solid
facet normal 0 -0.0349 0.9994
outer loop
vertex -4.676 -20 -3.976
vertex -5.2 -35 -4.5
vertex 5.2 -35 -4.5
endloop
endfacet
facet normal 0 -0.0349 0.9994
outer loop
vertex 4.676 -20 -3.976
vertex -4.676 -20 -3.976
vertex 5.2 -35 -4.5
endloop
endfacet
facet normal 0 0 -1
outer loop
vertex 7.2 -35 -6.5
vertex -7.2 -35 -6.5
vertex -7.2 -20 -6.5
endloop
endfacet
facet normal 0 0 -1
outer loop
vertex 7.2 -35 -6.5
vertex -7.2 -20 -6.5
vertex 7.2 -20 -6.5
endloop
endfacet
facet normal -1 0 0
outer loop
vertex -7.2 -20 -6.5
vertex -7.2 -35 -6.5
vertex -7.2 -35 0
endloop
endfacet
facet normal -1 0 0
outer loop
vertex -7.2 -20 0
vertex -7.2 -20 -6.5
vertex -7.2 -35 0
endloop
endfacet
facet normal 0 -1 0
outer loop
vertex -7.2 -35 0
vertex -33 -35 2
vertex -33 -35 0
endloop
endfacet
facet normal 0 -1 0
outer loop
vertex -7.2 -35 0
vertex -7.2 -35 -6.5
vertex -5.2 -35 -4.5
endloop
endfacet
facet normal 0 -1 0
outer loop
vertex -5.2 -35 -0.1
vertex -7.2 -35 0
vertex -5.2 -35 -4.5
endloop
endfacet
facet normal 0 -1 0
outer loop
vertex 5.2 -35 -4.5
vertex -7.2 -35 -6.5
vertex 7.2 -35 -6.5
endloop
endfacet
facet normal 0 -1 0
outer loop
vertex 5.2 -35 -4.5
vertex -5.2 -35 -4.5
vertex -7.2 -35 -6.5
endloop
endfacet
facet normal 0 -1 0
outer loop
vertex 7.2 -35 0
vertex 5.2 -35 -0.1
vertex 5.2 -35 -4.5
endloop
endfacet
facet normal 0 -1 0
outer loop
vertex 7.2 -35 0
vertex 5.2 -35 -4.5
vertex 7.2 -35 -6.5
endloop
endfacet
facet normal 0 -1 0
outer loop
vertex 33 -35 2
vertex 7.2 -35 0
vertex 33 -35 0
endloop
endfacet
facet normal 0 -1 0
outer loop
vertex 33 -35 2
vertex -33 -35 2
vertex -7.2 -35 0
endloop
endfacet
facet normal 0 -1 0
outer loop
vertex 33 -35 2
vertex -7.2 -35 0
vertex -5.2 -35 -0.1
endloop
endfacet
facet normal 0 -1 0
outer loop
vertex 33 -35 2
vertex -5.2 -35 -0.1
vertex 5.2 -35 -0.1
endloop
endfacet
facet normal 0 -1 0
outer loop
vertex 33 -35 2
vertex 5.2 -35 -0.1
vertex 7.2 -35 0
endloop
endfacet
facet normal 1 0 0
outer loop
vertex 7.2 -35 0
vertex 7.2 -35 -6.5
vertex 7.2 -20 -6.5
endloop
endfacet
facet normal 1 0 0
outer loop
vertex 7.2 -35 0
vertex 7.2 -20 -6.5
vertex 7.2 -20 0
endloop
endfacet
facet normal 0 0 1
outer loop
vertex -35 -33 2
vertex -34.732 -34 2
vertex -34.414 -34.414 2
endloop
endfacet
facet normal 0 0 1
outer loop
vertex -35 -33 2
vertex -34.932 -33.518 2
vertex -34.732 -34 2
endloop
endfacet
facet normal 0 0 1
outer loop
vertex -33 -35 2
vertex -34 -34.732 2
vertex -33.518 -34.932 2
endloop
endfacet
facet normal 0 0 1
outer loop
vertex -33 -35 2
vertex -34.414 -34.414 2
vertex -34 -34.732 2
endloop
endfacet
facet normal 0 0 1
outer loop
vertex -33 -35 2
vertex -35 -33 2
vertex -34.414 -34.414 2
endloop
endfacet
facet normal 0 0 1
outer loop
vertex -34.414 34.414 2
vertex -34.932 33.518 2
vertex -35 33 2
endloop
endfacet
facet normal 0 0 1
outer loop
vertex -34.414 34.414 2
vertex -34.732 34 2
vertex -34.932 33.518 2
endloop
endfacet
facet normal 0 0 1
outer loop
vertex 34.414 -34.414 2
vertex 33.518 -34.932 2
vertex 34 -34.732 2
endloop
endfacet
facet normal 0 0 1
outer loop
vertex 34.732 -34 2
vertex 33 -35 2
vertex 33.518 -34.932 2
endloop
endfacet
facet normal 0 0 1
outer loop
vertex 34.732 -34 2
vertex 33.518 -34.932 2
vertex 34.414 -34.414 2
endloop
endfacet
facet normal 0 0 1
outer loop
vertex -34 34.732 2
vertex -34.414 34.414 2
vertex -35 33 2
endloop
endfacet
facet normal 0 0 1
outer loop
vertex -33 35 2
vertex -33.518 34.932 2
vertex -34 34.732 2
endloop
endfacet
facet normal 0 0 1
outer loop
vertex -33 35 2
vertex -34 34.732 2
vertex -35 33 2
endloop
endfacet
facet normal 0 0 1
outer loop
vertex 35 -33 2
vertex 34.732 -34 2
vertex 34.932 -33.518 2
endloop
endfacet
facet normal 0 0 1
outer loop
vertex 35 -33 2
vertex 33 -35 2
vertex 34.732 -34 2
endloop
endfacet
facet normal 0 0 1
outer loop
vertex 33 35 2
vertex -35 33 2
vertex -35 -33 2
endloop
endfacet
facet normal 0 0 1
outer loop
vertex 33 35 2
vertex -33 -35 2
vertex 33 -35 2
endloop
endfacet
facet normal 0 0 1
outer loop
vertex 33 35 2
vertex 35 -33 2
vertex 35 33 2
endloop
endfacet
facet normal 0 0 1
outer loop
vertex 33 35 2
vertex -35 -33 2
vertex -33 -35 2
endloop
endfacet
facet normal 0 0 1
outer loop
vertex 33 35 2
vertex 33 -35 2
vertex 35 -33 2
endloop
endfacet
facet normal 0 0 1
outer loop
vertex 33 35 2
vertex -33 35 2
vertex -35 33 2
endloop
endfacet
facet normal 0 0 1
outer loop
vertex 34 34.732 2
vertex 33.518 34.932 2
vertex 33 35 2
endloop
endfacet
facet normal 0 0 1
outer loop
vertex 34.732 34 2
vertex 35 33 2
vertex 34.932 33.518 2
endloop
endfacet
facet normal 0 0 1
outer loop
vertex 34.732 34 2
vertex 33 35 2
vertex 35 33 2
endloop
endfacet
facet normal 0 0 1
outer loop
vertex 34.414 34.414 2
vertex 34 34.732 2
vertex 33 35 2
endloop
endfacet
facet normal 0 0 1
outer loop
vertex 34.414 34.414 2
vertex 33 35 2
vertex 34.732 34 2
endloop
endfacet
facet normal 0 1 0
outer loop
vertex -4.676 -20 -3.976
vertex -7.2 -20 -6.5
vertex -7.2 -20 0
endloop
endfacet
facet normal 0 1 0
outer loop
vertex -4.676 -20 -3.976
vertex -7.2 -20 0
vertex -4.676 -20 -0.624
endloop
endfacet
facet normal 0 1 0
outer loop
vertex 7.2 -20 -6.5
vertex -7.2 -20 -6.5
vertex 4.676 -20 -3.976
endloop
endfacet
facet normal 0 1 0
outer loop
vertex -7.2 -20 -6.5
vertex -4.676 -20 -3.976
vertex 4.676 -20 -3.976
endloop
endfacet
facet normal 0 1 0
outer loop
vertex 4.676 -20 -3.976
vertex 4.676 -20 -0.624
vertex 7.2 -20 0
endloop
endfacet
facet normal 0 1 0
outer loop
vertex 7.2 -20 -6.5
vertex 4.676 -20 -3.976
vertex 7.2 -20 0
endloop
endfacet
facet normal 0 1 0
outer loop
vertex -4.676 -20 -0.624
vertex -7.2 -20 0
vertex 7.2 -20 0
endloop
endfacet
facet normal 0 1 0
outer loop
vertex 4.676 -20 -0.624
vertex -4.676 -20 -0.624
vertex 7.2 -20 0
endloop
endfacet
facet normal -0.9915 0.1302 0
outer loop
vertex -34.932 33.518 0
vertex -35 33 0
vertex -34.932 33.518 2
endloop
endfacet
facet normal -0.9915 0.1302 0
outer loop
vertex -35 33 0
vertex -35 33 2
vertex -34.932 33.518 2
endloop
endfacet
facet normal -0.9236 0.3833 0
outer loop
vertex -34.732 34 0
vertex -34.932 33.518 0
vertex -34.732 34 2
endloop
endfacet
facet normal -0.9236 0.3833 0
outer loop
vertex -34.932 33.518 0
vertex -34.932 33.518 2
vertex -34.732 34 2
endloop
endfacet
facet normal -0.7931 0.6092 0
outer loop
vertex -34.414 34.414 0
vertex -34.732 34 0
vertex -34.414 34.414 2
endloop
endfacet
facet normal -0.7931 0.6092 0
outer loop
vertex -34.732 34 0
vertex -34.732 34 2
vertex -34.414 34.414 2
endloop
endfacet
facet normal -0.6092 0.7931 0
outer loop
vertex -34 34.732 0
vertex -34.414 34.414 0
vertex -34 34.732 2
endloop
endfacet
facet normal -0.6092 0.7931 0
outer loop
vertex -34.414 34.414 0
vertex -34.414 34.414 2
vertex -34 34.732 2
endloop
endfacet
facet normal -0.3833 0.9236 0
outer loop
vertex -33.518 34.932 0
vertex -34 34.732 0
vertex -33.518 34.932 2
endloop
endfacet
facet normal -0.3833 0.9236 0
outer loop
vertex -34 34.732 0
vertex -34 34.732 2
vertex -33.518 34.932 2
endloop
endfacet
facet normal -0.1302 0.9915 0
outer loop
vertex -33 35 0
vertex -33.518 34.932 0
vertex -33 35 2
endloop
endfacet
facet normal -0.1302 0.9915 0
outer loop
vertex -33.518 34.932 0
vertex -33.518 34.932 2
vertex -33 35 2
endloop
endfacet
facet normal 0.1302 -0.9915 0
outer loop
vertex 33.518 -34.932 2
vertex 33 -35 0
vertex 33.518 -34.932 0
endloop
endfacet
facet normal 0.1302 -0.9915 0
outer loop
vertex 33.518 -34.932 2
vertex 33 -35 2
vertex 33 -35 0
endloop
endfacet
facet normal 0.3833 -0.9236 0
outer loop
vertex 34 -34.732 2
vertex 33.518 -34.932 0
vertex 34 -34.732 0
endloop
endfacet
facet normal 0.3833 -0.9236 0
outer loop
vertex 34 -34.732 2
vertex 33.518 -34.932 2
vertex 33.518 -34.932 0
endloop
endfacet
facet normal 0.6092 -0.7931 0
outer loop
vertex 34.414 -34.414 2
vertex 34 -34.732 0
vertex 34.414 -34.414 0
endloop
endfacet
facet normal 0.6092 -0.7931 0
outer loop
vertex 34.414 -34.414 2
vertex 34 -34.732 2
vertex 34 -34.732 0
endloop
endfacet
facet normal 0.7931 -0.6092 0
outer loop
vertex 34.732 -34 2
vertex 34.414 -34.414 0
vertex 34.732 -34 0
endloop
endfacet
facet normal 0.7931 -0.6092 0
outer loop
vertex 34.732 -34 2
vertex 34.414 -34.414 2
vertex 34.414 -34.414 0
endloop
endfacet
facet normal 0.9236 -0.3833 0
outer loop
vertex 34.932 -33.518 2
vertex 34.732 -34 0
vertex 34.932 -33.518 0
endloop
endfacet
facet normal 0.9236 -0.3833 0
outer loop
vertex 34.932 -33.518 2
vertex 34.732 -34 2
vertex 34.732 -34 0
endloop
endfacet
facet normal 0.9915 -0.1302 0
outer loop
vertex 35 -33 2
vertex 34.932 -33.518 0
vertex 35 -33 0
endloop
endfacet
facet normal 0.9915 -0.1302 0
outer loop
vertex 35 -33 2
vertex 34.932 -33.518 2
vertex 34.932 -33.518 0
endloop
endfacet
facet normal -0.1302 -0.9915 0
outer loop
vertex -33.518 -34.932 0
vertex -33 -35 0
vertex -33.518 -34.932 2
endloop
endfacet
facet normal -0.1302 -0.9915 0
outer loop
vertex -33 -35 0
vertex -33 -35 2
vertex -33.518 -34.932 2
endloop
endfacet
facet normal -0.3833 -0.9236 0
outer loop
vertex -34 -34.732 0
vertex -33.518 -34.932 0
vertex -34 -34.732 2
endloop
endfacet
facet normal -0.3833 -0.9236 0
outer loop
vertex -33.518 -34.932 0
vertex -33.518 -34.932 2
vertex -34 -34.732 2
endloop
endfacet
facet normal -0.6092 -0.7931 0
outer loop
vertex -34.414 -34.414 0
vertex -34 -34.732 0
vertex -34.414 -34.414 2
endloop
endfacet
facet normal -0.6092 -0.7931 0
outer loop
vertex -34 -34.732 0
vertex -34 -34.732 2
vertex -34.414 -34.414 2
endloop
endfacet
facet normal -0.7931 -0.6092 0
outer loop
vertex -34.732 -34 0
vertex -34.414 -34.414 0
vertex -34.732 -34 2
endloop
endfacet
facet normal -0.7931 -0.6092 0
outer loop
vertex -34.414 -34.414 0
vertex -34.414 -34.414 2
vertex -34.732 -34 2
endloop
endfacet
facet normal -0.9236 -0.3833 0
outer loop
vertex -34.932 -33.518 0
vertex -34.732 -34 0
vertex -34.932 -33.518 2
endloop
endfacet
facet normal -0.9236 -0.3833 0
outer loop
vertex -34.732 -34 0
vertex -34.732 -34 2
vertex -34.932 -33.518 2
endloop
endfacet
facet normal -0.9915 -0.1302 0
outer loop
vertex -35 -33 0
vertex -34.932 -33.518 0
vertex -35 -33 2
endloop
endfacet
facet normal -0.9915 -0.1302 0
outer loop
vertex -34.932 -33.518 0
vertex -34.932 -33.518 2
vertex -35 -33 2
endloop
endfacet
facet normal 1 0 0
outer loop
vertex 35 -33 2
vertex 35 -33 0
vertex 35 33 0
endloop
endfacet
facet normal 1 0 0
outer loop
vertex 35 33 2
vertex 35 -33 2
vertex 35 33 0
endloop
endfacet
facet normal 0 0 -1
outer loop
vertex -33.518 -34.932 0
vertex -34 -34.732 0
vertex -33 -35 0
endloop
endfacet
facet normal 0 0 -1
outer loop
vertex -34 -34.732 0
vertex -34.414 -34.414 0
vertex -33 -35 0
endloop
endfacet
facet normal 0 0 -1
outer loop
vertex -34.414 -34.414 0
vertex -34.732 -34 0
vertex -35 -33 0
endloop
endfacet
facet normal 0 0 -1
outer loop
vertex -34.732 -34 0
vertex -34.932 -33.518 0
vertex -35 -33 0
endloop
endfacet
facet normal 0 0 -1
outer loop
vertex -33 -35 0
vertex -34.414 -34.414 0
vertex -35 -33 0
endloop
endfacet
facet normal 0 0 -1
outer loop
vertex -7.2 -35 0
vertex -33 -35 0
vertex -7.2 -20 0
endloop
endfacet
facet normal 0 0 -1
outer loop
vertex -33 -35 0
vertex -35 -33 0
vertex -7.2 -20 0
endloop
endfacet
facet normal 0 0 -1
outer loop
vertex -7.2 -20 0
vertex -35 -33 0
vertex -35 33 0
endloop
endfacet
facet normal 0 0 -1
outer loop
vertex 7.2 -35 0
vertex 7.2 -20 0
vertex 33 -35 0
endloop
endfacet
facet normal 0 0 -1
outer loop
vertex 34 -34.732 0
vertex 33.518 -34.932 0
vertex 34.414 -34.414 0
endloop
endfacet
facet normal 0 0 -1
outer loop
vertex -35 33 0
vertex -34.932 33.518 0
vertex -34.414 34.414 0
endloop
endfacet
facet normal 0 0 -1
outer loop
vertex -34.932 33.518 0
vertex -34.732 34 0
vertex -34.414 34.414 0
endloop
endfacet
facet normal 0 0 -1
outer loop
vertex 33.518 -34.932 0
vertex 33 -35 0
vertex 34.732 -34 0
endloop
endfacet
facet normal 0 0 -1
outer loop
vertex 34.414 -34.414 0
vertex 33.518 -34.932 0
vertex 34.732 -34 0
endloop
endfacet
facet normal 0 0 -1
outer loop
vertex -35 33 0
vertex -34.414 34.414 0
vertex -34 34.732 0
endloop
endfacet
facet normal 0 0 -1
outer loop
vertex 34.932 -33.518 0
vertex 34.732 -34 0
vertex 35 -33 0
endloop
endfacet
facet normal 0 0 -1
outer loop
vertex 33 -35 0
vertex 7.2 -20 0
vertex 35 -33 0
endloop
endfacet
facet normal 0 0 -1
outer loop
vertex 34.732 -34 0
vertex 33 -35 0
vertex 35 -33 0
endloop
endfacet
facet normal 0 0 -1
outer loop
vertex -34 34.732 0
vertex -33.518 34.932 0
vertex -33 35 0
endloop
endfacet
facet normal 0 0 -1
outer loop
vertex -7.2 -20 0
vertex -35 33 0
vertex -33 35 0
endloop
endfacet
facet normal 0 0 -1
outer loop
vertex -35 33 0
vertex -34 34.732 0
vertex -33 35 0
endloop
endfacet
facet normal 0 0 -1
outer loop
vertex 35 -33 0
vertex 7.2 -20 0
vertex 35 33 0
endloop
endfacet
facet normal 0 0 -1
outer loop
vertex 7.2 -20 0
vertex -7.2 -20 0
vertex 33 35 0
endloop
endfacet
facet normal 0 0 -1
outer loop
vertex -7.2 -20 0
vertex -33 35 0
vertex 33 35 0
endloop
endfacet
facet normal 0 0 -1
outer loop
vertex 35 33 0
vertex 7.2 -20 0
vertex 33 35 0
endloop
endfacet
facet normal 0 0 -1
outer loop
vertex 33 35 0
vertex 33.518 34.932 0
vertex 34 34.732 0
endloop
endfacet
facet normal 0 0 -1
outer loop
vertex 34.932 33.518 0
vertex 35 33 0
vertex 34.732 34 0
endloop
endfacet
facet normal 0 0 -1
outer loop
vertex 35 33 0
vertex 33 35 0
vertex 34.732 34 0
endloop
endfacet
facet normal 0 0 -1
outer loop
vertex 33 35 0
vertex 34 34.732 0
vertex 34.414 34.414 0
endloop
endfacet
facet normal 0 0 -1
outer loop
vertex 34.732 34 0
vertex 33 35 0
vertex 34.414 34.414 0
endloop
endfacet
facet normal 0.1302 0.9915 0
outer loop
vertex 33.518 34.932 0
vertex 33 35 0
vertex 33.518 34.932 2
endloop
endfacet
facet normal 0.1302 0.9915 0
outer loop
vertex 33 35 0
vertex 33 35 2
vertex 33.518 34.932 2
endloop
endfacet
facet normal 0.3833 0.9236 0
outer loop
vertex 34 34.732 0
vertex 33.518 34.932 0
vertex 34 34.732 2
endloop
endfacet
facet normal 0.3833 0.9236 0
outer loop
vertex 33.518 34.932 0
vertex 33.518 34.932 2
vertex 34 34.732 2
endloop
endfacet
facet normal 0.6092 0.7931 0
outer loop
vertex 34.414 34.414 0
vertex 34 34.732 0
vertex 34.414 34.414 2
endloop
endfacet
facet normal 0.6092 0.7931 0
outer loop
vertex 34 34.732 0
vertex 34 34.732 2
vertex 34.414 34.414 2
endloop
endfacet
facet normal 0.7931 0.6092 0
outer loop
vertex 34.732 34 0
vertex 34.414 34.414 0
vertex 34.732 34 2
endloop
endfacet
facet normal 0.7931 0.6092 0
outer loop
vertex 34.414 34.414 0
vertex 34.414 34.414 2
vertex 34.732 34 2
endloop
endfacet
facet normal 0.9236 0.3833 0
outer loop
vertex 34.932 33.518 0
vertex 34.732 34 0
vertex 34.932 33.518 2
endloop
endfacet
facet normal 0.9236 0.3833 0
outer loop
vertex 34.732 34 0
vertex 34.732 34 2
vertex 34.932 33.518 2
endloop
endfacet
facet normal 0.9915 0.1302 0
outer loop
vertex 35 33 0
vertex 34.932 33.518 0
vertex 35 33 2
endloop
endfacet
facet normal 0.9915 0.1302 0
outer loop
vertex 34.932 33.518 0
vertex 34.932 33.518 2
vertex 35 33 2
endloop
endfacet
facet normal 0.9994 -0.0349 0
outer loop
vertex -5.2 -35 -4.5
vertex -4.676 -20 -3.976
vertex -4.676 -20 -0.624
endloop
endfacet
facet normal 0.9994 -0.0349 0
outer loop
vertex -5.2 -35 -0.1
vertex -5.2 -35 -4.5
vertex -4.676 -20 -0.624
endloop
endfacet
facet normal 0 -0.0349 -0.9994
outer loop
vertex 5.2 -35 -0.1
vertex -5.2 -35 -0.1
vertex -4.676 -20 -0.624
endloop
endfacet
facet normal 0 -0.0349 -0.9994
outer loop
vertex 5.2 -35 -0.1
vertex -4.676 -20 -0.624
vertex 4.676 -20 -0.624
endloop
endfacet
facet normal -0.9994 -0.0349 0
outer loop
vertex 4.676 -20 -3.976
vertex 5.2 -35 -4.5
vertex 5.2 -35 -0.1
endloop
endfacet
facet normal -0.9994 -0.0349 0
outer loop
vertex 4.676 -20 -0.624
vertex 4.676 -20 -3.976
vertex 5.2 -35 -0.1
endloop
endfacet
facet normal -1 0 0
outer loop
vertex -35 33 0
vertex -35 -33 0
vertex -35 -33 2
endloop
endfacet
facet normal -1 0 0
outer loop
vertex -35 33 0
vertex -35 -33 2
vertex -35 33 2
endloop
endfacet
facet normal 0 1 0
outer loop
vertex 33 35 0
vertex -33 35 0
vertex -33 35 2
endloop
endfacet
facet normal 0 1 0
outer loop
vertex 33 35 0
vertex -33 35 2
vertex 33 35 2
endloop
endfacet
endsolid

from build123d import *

# Parameters (mm, degrees)
ESQUISSE1_W        = 70
ESQUISSE1_H        = 70
BOSS_EXTRU_1_DEPTH = 2
ESQUISSE3_W        = 14.4
ESQUISSE3_H        = 8.4
ESQUISSE3_W_2      = 10.4
ESQUISSE3_H_2      = 4.4
BOSS_EXTRU_3_DEPTH = 15
D_POUILLE3_ANGLE   = 2
CONG_1_R           = 2


with BuildPart() as part:
    # Esquisse1 → Boss.-Extru.1 (new body)
    with BuildSketch(Plane.XY):
        Rectangle(ESQUISSE1_W, ESQUISSE1_H)
    extrude(amount=BOSS_EXTRU_1_DEPTH)

    # Esquisse3 → Boss.-Extru.3 (add)
    with BuildSketch(Plane.XZ.offset(35)):
        with Locations((0, -2.3)):
            Rectangle(ESQUISSE3_W, ESQUISSE3_H)
        with Locations((0, -2.3)):
            Rectangle(ESQUISSE3_W_2, ESQUISSE3_H_2, mode=Mode.SUBTRACT)
    extrude(amount=-BOSS_EXTRU_3_DEPTH)

    # Dépouille3
    d_pouille3_faces = [part.faces().sort_by_distance(p)[0] for p in [
        (0, -27.5, -0.1),
        (-5.2, -27.5, -2.3),
        (0, -27.5, -4.5),
        (5.2, -27.5, -2.3),
    ]]
    draft(d_pouille3_faces, Plane(origin=(-35, -35, 2), x_dir=(0, 0, -1), z_dir=(0, -1, 0)), D_POUILLE3_ANGLE)

    # Congé1
    cong_1_edges = [part.edges().sort_by_distance(p)[0] for p in [
        (35, -35, 1),
        (-35, -35, 1),
        (-35, 35, 1),
        (35, 35, 1),
    ]]
    fillet(cong_1_edges, radius=CONG_1_R)


solid = part.part
